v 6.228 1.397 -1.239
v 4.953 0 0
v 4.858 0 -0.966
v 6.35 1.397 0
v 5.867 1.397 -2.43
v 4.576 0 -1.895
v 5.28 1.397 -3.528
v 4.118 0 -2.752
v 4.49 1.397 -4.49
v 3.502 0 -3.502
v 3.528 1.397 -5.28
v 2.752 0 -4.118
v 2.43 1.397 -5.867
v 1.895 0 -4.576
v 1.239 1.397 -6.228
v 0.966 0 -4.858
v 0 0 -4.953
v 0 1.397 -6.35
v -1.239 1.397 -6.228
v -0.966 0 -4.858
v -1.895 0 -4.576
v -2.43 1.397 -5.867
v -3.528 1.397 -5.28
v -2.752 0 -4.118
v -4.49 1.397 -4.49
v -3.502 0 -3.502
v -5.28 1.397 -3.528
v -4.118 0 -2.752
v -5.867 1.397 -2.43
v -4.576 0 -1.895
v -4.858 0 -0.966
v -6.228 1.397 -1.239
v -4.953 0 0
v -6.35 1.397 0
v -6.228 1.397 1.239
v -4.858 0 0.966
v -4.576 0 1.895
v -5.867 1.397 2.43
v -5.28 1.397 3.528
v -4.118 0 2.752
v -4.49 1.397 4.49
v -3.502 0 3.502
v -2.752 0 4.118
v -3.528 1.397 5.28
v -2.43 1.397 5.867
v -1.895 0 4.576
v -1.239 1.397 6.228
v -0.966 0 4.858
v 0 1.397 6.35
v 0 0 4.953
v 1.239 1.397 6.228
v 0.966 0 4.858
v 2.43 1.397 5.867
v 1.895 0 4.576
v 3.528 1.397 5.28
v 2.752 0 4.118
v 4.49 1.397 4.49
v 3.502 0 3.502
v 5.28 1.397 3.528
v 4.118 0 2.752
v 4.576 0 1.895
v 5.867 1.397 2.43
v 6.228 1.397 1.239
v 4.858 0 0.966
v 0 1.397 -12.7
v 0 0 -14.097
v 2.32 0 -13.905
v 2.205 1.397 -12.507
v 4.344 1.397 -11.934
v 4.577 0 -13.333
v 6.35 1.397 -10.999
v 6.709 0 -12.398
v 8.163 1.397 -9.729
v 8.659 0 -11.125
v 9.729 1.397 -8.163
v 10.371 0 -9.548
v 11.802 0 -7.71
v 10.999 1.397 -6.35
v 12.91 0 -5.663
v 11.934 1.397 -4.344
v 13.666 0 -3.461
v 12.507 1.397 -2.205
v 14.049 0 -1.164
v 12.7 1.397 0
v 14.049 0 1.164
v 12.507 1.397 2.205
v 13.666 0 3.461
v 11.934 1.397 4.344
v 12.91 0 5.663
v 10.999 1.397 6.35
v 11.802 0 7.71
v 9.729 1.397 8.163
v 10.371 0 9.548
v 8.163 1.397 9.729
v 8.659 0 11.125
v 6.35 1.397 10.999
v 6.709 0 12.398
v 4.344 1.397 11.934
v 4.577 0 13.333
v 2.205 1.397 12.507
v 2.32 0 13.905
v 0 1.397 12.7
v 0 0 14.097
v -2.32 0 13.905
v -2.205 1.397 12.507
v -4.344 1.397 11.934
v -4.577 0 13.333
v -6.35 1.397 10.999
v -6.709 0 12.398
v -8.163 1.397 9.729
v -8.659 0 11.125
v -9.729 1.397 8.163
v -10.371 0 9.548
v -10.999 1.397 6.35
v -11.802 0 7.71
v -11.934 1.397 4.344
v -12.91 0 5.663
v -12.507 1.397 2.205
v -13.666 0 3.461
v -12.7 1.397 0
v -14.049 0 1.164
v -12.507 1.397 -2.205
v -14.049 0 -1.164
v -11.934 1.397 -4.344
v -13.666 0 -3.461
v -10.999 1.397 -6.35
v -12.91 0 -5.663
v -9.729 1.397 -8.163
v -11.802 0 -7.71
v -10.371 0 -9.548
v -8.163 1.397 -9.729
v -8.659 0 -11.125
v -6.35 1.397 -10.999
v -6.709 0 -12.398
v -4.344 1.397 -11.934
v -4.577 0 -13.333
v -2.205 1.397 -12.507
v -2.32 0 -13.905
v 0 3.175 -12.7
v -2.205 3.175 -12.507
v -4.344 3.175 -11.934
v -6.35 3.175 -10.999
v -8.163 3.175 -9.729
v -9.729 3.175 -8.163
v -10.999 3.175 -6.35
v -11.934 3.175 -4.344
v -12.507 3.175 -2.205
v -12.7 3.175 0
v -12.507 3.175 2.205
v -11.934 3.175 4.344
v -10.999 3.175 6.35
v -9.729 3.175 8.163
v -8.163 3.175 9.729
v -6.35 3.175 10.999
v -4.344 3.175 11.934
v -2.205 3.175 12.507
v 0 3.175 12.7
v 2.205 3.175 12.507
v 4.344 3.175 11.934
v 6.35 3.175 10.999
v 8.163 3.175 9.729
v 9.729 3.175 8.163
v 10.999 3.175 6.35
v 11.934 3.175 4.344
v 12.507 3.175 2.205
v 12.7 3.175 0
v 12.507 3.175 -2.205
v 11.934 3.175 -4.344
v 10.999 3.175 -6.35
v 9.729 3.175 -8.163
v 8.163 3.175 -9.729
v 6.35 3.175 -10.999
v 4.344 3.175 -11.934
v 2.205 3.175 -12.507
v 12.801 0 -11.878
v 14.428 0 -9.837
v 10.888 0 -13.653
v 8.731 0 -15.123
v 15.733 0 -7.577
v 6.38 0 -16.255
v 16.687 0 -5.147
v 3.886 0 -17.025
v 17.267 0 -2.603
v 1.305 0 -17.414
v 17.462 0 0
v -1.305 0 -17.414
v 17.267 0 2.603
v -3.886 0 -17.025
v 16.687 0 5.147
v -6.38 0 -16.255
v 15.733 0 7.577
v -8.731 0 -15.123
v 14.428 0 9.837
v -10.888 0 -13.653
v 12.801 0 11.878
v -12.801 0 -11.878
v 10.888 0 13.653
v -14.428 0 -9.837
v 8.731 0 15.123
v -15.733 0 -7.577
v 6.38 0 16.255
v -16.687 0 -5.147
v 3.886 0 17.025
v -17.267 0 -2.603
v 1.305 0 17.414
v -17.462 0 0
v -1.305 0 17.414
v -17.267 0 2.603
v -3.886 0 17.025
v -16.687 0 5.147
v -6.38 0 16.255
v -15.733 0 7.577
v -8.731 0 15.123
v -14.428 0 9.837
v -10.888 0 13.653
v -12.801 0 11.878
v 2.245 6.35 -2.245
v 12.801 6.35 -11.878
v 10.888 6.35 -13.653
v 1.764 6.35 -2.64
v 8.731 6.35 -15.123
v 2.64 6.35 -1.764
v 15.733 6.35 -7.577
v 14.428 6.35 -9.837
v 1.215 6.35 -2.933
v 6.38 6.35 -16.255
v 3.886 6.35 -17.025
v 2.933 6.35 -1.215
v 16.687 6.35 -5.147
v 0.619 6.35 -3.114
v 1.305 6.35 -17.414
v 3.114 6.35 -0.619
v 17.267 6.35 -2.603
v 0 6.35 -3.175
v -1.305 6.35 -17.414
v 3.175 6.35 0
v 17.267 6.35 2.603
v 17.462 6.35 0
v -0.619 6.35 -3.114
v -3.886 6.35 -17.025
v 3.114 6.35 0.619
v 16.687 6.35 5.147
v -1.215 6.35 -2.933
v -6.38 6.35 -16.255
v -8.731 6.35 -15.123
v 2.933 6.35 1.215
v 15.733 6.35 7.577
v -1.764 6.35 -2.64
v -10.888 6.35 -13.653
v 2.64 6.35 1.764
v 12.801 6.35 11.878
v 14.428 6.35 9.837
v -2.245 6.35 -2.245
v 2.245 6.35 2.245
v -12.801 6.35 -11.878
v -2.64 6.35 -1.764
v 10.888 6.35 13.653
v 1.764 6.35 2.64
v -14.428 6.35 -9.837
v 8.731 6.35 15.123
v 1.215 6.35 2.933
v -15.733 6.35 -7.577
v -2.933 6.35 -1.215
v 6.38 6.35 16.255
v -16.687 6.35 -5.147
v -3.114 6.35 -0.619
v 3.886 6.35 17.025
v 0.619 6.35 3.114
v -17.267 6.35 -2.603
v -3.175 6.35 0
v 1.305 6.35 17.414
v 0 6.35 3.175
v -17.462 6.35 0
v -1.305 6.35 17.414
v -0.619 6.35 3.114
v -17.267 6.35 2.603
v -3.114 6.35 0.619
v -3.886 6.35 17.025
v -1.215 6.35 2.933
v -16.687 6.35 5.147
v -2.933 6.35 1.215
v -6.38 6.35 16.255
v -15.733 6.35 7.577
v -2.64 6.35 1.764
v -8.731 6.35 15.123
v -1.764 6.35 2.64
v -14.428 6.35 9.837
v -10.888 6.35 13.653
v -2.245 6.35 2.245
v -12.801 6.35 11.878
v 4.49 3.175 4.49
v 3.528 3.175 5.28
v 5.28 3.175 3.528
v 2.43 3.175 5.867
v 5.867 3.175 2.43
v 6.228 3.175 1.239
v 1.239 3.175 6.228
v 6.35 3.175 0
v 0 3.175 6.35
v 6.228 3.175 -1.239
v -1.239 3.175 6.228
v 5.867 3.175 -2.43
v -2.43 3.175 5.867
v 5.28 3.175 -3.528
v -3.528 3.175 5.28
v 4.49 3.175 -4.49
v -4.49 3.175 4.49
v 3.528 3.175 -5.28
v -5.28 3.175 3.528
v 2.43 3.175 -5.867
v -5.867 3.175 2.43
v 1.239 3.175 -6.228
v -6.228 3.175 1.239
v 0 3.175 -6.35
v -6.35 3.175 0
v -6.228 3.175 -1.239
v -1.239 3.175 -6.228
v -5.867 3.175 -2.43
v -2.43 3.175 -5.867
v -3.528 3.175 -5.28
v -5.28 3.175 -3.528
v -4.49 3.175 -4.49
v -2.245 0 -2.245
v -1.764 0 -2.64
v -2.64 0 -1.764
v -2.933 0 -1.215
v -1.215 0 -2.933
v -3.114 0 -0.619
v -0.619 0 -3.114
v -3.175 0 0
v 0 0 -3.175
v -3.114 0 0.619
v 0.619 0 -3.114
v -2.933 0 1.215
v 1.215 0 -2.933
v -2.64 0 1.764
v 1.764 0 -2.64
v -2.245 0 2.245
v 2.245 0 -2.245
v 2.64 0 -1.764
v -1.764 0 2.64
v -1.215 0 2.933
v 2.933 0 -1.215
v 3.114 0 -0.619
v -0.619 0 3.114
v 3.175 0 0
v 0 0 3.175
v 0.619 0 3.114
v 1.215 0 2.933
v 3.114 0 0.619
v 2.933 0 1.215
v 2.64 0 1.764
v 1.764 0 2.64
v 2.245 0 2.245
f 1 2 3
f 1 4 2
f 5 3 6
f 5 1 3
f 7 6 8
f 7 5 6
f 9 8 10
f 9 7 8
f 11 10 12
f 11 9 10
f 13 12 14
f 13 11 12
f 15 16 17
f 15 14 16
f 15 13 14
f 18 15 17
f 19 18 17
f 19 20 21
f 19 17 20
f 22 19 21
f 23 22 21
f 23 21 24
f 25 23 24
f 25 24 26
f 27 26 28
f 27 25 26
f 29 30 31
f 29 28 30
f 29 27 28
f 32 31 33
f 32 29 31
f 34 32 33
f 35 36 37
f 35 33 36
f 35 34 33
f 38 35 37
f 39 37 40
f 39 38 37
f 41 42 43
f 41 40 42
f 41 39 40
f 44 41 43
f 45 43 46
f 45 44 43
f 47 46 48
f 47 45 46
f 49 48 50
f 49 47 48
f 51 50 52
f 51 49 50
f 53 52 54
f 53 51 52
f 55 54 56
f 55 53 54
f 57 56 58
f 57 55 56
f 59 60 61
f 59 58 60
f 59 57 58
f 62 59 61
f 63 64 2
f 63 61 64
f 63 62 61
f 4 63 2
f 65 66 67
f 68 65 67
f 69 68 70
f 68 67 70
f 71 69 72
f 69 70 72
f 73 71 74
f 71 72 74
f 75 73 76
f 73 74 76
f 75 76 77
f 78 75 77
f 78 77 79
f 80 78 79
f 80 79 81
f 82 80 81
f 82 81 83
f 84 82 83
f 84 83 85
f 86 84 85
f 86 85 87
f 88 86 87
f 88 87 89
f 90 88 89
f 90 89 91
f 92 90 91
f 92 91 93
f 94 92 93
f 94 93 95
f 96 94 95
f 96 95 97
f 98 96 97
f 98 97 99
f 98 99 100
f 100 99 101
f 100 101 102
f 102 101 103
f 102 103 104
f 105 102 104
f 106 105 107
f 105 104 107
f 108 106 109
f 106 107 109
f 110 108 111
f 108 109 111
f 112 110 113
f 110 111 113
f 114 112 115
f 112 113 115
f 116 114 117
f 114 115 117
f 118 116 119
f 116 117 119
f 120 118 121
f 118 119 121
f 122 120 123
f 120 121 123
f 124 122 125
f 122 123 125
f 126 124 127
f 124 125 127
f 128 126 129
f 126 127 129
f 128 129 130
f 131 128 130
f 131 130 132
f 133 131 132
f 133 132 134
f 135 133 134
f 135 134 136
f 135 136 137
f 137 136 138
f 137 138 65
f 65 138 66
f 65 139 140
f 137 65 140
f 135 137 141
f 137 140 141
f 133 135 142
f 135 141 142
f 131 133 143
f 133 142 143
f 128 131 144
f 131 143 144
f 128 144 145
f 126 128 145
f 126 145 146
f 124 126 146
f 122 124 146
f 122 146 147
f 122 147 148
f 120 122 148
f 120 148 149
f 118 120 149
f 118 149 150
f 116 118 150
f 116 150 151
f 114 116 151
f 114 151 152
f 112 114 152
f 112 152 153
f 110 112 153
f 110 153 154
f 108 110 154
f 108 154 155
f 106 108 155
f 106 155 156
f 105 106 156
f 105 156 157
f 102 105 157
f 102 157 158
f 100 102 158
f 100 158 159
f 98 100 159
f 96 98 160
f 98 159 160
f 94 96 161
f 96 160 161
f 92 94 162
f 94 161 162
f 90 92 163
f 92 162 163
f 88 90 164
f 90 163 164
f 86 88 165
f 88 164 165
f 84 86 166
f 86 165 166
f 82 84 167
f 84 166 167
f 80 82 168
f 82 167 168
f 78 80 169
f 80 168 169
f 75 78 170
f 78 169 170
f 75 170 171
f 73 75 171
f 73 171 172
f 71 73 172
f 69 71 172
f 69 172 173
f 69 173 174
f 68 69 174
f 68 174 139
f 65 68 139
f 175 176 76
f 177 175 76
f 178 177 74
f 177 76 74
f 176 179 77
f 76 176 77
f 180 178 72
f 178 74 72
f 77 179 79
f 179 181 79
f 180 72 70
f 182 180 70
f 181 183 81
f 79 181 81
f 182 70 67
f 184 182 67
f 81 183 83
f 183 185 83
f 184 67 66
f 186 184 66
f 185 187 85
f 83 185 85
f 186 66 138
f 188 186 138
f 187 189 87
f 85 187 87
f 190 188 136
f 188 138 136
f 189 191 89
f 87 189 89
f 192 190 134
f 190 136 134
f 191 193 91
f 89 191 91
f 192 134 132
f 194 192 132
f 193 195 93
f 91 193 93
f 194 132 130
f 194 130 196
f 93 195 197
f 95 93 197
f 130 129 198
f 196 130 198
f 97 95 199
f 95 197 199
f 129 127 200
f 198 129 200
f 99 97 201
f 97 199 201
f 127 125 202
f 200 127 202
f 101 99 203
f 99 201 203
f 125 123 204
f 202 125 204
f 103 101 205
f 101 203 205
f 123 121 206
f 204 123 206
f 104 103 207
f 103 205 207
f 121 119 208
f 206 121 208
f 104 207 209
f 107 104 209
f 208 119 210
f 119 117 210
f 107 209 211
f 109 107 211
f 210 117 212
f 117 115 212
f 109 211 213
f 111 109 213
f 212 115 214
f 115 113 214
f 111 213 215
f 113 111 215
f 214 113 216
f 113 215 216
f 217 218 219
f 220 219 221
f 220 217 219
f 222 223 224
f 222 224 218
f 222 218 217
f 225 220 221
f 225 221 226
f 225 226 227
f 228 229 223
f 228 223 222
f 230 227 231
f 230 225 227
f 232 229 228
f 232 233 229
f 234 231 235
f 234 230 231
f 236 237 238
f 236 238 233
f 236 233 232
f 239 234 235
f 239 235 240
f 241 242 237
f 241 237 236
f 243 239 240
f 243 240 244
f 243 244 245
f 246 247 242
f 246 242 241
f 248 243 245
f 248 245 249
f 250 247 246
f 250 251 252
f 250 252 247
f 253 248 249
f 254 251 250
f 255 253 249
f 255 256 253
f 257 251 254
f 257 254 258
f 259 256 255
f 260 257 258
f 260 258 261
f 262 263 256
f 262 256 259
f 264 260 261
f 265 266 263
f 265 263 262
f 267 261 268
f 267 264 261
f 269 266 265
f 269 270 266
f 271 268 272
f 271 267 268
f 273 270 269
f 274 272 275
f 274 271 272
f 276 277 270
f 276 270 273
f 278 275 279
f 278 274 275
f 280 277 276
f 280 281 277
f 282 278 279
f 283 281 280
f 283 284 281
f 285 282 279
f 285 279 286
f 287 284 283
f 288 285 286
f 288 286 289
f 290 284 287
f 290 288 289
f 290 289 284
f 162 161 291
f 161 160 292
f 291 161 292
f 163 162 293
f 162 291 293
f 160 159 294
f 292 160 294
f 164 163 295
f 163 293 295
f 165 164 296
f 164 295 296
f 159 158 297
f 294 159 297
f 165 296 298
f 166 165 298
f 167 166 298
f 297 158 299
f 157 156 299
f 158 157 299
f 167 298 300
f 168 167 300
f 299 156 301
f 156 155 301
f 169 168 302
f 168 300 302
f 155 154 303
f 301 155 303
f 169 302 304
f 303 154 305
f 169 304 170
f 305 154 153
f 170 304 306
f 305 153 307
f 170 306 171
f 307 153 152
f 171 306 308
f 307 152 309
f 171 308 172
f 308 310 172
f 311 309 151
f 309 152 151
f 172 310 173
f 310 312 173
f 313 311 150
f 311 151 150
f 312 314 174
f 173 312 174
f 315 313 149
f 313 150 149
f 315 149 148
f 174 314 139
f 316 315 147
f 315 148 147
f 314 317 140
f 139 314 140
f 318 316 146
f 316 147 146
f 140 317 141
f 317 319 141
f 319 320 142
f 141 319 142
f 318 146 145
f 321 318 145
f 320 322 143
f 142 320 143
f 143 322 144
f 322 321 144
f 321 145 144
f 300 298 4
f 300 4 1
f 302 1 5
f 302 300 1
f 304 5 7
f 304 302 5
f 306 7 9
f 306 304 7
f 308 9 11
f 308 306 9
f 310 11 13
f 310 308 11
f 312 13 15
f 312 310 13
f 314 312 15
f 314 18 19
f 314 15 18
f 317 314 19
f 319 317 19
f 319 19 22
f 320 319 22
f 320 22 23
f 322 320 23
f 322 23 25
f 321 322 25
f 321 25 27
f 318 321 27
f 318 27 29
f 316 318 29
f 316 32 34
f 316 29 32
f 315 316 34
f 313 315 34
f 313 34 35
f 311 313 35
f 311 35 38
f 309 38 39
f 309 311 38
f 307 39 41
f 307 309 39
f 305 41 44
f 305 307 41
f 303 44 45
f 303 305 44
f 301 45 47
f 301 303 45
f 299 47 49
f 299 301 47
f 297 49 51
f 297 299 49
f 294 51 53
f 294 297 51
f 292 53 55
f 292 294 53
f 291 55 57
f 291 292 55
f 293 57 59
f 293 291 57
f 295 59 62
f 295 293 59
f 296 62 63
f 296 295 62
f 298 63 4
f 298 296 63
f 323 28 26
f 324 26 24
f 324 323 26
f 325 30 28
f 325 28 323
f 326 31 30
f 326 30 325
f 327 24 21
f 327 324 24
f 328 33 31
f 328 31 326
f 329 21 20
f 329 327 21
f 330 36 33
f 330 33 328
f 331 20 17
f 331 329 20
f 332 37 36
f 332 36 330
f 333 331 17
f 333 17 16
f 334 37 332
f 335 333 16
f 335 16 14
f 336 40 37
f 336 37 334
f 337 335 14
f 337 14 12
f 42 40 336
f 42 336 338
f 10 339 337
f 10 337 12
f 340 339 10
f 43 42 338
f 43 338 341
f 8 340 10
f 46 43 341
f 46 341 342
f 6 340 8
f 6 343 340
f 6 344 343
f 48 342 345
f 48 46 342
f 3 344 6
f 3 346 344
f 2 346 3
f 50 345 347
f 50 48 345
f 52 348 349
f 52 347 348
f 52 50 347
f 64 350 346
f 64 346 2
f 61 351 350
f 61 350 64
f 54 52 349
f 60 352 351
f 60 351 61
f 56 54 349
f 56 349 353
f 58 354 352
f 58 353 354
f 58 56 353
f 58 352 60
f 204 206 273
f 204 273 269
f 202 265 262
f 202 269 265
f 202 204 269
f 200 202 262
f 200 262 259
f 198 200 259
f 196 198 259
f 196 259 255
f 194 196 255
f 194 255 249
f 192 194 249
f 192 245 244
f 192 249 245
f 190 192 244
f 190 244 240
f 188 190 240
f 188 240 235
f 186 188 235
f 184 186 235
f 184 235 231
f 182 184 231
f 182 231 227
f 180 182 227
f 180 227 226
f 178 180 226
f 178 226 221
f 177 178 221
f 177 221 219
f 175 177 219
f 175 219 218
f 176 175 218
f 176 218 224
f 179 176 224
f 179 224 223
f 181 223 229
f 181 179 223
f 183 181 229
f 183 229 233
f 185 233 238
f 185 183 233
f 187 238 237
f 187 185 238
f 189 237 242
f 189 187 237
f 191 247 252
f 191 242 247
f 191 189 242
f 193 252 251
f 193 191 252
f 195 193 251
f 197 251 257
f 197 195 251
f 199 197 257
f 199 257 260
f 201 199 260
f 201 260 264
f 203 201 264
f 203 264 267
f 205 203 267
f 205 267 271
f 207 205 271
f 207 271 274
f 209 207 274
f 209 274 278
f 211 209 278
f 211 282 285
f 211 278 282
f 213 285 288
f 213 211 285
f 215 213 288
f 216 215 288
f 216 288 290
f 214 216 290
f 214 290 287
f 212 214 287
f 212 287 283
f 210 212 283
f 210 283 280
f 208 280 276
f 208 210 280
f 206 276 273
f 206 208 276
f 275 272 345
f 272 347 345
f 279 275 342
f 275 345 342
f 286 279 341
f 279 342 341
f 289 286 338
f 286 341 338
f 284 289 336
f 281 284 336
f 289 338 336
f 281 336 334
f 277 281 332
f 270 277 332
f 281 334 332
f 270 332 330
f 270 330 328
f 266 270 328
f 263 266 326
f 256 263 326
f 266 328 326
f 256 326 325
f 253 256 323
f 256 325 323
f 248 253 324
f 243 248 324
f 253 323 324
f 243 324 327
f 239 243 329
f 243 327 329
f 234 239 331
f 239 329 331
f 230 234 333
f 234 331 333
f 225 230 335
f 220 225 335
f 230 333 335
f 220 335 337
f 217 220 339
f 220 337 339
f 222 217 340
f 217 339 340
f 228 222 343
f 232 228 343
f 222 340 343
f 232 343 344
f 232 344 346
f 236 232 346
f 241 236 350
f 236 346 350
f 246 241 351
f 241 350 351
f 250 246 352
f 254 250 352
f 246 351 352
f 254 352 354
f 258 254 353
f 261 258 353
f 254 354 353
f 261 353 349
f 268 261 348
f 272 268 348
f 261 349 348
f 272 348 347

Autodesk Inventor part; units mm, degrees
ref_plane "YZ Plane" through (0, 0, 0) normal (1, 0, 0) x (0, 1, 0)
ref_plane "XZ Plane" through (0, 0, 0) normal (0, 1, 0) x (-1, 0, 0)
ref_plane "XY Plane" through (0, 0, 0) normal (0, 0, 1) x (1, 0, 0)
sketch "SketchCircles" plane through (0, 0, 0) normal (0, 1, 0) x (-1, 0, 0)
  circle A0 centre (0, 0) radius 12.7
  circle A1 centre (0, 0) radius 6.35
  circle A2 centre (0, 0) radius 17.4625
  dimension "d0" = 25.4
  dimension "d1" = 12.7
  dimension "d2" = 34.925
extrude "Extrusion100" add sketch "SketchCircles" along normal blind 6.35 contours A0 | A1 | A2
sketch "SketchLines" plane through (0, 0, 0) normal (0, -1, 0) x (1, 0, 0)
  line L0 (-17.7365, 0) -> (17.5532, 0)
  line L1 (-0.0917, 17.7823) -> (-0.0917, -17.324)
  point P0 (0, 0)
hole "Hole1" at (0, 0, 0) direction (0, 1, 0) diameter 25.4 depth 3.175
sketch "Sketch3" plane through (0, 3.175, 0) normal (0, -1, 0) x (1, 0, 0)
  circle A0 centre (0, 0) radius 6.35
  dimension "d12" = 12.7
extrude "Extrusion2" add sketch "Sketch3" along normal blind 3.175
chamfer "Chamfer1" distance 1.397 angle 45 1 edges at (0, 0, 12.7)
chamfer "Chamfer2" distance 1.397 angle 45 1 edges at (-6.35, 0, 0)
sketch "Sketch4" plane through (0, 6.35, 0) normal (0, 1, 0) x (1, 0, 0)
  circle A0 centre (0, 0) radius 3.9688
  dimension "d21" = 7.9375
hole "Hole2" at (0, 6.35, 0) direction (0, -1, 0) diameter 6.35 depth 12.7
properties part number "tiedown-hook-mount"
